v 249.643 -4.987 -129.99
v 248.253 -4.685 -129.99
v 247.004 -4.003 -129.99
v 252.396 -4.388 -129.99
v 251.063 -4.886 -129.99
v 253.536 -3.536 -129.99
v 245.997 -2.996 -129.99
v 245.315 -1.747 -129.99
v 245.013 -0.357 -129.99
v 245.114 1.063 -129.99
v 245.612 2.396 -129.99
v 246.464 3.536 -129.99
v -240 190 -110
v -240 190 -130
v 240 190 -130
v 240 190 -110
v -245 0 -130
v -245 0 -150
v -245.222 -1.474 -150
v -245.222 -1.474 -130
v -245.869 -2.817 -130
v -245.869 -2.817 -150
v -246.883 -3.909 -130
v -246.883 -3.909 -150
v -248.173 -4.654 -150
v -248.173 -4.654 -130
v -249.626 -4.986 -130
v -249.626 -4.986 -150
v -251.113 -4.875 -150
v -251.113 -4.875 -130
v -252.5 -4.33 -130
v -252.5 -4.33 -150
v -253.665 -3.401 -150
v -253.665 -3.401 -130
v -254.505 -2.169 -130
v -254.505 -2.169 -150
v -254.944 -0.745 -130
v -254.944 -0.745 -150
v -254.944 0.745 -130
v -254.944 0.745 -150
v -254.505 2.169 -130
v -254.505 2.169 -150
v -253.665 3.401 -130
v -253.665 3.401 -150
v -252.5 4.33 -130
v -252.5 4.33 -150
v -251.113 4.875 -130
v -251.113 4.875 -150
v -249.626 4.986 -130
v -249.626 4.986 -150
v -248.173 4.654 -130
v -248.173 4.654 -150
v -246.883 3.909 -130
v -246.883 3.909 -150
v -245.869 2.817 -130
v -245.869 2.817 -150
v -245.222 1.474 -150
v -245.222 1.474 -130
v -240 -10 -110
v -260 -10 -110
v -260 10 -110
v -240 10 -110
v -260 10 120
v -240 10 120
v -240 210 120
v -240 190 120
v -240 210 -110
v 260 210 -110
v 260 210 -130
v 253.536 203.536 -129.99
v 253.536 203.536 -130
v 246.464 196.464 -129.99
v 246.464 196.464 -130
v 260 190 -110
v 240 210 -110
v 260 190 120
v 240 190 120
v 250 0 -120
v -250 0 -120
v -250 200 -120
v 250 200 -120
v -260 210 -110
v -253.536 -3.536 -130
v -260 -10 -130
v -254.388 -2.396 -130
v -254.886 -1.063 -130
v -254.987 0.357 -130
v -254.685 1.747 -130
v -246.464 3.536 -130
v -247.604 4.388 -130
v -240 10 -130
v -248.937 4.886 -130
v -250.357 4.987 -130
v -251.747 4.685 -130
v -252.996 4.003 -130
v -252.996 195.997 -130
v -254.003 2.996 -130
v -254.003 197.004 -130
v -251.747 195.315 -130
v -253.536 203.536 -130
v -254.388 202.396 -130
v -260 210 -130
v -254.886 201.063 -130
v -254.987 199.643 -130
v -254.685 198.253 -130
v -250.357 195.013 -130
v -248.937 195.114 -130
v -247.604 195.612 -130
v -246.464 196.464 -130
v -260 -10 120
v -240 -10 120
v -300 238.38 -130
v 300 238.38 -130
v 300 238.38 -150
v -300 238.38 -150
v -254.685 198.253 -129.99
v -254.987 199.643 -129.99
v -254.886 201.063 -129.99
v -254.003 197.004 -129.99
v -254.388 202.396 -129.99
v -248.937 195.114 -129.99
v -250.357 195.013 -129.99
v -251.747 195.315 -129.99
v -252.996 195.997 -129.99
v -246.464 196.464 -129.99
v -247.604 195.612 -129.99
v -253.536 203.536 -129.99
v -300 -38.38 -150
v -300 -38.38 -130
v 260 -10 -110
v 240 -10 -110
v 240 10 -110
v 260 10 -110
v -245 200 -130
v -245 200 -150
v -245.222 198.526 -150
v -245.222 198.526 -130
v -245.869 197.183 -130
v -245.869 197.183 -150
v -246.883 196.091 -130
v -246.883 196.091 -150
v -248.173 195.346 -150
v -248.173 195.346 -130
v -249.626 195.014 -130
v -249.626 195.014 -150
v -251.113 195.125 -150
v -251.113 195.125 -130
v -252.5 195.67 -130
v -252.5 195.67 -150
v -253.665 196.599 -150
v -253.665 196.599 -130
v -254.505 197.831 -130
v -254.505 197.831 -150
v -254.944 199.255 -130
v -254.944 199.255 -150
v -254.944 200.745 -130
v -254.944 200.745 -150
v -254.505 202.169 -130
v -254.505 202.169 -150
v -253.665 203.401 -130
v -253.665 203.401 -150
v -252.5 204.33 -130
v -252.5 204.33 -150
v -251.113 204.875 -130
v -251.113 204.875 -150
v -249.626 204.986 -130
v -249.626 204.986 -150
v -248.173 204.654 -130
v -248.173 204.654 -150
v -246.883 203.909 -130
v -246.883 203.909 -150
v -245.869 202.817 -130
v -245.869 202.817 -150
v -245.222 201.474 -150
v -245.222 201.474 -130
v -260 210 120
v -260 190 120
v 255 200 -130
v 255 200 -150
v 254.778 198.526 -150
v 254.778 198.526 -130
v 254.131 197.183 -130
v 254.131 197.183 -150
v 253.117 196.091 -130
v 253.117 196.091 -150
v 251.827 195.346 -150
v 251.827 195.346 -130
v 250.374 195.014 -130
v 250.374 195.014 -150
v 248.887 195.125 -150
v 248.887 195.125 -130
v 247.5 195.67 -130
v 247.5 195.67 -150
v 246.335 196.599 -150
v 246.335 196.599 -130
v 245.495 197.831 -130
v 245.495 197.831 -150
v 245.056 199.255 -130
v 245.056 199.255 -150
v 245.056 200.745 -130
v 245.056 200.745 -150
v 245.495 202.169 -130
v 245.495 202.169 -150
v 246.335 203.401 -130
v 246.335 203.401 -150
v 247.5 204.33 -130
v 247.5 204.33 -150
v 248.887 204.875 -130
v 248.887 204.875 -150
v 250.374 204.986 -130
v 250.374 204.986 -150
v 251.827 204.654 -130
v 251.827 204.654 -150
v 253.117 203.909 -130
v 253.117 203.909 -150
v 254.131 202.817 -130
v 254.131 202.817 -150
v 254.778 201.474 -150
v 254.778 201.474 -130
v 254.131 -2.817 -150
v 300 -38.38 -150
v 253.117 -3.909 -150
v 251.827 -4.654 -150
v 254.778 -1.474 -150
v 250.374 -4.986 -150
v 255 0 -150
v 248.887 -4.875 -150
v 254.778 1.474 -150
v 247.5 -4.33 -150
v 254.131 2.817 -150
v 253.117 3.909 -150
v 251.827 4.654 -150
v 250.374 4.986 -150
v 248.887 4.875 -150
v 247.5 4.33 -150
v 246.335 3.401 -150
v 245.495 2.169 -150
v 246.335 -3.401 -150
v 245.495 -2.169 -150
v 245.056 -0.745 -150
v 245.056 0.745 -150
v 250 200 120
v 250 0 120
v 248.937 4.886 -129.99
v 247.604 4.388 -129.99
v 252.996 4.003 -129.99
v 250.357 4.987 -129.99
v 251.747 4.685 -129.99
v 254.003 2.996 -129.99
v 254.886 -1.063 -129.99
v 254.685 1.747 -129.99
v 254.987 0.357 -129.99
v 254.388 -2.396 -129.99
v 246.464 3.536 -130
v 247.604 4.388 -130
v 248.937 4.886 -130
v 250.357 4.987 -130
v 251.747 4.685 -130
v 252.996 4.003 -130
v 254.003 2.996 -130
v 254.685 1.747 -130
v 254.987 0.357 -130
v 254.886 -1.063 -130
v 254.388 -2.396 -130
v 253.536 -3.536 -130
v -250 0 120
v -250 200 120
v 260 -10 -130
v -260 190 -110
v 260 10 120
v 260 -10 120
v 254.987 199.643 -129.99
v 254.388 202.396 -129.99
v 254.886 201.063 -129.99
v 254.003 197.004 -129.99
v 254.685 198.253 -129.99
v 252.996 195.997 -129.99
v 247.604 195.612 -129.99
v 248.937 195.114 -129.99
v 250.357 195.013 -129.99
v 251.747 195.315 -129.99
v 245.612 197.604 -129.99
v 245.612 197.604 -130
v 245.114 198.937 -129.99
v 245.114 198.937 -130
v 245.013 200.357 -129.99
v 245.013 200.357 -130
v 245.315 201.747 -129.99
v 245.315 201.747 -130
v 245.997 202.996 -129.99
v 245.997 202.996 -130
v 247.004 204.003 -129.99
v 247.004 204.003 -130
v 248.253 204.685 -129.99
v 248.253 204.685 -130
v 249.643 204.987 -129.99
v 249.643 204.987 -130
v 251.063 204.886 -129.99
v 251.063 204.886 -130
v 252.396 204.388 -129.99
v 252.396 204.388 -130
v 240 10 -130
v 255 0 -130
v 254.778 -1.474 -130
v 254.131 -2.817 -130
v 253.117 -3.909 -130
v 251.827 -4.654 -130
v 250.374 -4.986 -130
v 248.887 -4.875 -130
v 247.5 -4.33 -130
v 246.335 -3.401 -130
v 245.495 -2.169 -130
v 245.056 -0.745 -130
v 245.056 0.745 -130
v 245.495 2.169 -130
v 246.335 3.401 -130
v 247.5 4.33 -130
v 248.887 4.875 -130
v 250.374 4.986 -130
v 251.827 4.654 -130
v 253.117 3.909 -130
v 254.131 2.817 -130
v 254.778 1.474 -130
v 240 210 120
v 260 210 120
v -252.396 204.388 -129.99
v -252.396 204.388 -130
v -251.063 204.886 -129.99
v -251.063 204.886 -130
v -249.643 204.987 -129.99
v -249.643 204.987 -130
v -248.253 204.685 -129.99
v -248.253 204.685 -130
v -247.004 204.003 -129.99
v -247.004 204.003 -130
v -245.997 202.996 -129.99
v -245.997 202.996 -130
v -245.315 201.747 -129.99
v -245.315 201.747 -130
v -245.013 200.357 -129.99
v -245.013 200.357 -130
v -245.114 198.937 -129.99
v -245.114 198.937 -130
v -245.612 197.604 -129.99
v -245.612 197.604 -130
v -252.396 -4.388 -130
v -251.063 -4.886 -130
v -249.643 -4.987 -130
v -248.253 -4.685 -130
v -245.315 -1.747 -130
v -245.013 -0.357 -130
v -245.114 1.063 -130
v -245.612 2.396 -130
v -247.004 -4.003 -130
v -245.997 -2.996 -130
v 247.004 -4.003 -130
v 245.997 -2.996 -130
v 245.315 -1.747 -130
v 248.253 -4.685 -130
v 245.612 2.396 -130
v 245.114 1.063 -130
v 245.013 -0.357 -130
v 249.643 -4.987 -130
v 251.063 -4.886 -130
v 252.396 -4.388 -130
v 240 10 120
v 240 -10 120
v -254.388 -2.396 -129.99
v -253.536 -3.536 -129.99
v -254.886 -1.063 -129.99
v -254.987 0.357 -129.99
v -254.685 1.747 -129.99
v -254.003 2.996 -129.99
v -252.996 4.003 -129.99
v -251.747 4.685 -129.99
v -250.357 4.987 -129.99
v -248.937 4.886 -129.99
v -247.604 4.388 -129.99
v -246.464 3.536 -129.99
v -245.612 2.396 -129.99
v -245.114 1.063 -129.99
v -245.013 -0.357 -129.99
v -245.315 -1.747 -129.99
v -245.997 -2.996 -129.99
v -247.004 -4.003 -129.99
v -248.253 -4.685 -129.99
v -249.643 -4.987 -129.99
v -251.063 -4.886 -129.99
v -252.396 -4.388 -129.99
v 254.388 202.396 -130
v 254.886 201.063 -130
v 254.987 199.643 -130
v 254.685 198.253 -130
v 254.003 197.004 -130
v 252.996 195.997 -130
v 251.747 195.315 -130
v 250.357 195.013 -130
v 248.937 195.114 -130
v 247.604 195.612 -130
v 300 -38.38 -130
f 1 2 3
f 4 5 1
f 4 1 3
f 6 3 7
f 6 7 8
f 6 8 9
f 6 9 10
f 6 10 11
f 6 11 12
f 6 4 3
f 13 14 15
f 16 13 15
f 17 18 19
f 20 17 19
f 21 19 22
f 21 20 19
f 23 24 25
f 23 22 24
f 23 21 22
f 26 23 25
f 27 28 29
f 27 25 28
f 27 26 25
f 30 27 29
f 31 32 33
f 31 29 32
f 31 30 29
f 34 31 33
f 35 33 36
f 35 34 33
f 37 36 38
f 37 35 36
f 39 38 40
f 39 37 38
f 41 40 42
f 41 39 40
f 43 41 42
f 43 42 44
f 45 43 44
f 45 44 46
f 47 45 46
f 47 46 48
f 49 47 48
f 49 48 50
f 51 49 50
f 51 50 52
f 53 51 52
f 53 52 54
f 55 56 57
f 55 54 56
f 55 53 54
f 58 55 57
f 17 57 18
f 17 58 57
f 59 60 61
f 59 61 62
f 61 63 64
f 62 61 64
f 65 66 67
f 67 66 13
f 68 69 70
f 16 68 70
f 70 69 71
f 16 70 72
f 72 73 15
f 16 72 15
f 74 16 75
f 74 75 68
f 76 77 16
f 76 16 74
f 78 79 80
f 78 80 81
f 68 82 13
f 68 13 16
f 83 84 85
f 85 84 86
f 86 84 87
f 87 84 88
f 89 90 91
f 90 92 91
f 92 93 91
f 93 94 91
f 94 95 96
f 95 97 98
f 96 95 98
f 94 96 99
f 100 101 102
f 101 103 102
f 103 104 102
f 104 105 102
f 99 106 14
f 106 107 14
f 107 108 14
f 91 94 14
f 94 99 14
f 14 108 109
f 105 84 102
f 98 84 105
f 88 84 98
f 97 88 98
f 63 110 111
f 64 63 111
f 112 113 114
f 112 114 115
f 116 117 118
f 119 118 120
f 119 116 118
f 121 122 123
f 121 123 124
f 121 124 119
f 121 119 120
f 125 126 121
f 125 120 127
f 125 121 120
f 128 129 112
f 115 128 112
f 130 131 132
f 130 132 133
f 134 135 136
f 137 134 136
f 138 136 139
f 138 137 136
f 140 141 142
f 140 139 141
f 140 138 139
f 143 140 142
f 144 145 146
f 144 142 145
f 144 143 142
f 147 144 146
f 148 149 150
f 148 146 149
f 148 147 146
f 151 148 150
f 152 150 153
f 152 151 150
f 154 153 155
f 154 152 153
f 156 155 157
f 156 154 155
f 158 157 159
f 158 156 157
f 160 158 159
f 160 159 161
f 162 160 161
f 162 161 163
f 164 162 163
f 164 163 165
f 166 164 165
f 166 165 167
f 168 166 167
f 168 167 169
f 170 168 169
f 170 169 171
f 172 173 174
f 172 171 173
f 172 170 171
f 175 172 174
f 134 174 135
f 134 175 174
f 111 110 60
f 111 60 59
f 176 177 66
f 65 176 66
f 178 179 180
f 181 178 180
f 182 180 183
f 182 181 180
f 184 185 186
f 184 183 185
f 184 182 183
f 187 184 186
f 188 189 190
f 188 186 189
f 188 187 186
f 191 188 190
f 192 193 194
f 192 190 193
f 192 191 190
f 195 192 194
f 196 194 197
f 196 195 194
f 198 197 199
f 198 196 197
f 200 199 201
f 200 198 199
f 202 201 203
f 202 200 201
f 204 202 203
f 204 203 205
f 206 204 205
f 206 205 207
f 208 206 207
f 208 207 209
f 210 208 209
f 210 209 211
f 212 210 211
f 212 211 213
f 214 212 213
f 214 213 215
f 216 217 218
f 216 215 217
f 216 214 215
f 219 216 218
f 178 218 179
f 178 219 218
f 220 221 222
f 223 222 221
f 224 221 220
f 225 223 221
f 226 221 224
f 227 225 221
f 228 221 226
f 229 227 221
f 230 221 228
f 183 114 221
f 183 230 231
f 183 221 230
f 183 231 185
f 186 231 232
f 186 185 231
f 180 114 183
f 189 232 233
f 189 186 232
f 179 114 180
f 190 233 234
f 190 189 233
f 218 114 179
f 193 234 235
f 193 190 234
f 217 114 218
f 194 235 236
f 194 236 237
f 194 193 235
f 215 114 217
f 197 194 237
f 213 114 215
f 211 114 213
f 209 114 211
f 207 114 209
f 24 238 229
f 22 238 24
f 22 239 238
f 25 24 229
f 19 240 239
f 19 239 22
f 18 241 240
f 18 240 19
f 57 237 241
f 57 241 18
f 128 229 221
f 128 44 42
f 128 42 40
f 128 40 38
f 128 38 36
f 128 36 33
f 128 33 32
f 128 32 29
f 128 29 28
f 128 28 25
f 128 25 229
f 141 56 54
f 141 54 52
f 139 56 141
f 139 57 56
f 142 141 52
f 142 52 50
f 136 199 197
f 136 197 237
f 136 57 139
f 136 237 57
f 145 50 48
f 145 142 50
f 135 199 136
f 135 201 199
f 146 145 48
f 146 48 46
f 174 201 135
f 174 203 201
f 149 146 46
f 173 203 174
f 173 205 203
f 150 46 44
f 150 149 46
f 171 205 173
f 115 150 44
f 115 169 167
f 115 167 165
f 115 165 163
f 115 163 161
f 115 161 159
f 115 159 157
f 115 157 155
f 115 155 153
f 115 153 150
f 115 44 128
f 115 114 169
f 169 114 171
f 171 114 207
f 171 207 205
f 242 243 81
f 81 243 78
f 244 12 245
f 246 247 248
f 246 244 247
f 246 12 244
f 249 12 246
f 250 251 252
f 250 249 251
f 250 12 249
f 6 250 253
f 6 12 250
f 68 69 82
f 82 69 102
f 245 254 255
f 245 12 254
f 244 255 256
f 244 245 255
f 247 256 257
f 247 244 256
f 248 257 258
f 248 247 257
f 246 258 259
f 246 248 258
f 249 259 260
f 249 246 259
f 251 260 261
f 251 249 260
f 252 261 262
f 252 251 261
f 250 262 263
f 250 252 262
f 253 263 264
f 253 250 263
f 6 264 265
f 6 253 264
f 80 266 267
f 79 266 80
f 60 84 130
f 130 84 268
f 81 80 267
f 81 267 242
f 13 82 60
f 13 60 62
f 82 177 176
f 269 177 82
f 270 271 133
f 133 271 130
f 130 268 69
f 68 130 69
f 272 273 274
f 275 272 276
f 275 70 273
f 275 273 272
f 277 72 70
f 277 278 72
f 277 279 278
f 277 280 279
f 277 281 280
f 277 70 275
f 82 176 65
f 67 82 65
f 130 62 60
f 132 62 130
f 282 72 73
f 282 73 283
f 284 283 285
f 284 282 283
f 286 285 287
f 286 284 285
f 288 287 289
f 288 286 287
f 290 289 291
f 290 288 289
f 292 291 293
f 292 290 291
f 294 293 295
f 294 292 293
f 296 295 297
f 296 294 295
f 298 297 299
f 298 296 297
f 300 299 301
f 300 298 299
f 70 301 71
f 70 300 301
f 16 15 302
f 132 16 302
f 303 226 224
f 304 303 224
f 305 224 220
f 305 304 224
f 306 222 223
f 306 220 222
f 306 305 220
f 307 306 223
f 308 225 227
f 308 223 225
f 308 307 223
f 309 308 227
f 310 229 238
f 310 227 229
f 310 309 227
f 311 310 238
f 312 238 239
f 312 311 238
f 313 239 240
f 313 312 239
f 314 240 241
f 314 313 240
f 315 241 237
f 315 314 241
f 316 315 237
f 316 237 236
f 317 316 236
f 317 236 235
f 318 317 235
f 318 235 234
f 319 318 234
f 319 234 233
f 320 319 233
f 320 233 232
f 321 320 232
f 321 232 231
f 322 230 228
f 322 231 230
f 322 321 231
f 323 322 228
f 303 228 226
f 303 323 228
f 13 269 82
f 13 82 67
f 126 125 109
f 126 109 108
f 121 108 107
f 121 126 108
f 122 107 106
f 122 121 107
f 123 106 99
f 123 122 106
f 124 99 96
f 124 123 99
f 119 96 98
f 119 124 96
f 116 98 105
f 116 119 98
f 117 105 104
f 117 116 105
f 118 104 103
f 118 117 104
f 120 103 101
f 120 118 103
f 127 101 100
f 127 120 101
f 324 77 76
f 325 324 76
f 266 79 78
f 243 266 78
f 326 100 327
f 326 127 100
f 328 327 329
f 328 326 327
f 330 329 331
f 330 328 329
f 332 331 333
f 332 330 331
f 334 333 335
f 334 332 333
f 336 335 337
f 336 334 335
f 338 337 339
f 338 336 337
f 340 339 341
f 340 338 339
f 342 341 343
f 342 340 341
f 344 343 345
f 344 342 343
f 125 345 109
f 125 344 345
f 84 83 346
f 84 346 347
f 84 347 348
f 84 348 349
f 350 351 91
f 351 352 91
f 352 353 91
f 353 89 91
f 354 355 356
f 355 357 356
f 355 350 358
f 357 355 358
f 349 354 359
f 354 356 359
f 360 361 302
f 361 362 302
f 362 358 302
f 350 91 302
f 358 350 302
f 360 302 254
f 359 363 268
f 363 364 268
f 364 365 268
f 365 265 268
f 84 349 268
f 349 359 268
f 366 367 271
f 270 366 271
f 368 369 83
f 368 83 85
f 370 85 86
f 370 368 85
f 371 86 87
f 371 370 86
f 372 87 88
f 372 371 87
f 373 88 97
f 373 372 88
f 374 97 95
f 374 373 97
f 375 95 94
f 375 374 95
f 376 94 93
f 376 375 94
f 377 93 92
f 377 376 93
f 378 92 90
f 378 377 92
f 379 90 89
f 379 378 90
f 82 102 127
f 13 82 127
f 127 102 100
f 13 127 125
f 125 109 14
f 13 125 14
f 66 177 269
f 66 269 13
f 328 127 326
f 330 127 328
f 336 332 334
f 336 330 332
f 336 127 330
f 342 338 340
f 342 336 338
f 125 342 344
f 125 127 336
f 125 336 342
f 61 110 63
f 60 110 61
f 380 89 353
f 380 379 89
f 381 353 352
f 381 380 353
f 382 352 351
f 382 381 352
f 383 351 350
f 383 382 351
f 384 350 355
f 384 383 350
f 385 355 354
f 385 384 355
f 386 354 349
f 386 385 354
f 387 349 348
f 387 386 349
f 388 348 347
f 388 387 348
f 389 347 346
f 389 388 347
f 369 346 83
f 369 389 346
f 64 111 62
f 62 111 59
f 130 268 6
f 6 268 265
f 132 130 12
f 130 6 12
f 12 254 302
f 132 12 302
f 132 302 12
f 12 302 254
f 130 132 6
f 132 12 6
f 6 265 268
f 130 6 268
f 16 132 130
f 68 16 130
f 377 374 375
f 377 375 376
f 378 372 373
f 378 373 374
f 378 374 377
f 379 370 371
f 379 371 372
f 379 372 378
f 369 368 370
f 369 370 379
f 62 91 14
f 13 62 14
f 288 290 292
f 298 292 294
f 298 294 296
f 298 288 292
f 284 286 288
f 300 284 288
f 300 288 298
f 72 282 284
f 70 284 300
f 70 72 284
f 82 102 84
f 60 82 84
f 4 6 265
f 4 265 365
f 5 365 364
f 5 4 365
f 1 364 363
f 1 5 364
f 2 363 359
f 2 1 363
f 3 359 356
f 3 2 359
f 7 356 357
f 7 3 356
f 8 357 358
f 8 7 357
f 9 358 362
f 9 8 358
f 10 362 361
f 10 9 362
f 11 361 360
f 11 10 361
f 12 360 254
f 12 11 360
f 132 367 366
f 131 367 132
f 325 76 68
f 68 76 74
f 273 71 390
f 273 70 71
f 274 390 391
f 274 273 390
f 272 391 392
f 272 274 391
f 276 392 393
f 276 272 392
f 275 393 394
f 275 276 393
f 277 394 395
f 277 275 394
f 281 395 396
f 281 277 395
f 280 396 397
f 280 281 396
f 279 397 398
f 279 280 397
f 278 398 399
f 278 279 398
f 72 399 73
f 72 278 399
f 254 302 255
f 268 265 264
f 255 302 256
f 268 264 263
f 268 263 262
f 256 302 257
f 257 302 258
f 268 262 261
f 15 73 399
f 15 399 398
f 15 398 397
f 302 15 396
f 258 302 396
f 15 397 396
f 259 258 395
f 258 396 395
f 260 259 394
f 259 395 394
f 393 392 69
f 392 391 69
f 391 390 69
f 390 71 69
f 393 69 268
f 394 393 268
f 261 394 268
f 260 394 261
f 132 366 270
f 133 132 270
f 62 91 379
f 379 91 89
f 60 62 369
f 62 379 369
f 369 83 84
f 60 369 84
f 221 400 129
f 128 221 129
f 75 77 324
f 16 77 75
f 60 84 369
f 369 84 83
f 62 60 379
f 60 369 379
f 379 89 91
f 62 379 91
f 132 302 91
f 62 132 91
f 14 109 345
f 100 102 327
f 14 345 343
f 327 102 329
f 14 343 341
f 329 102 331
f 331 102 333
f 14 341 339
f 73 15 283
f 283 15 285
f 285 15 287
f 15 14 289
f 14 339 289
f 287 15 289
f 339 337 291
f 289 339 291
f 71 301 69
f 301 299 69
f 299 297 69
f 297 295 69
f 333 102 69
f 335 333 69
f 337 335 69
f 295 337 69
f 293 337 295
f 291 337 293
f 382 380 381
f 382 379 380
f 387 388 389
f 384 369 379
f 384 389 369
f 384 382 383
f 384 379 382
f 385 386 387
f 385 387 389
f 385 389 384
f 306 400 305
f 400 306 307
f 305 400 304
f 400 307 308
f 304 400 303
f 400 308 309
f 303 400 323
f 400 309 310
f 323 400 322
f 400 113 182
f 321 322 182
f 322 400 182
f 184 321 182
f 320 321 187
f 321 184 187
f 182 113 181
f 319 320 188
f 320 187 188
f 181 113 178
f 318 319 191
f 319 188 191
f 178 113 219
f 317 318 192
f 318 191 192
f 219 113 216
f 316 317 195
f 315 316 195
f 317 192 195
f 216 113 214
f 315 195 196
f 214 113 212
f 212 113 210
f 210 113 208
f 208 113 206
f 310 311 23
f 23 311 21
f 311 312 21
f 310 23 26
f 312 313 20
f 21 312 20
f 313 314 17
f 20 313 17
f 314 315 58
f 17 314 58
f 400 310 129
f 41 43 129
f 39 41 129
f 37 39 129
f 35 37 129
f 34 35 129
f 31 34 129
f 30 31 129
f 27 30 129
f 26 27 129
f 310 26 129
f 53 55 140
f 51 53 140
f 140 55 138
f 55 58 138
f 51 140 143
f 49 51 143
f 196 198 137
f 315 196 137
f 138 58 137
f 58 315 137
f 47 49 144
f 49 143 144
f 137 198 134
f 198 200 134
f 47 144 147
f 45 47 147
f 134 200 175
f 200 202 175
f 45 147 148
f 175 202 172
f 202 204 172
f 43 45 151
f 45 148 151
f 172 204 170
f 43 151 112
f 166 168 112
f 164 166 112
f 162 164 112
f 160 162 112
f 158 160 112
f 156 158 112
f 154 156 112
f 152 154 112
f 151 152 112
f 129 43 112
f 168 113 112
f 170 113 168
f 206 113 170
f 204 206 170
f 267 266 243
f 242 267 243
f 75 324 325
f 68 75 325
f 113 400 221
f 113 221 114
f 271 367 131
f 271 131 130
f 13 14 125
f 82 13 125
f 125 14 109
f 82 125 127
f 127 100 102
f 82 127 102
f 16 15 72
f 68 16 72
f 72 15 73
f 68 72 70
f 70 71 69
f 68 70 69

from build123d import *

# Parameters (mm, degrees)
SKETCH2_W                               = 500
SKETCH2_H                               = 240
BOSS_EXTRUDE1_DEPTH                     = 200
SQUARE_RODS_START                       = -10
SQUARE_RODS_SQUARE_BAR_20_2_OUTLINE_W   = 20
SQUARE_RODS_SQUARE_BAR_20_2_OUTLINE_H   = 230
SQUARE_RODS_SQUARE_BAR_20_2_DEPTH       = 20
SQUARE_RODS_START_2                     = -130
SQUARE_RODS_SQUARE_BAR_20_2_2_DEPTH     = 20
SQUARE_RODS_SQUARE_BAR_20_2_3_DEPTH     = 20
SQUARE_RODS_SQUARE_BAR_20_2_4_OUTLINE_W = 20
SQUARE_RODS_SQUARE_BAR_20_2_4_OUTLINE_H = 230
SQUARE_RODS_SQUARE_BAR_20_2_4_DEPTH     = 20
SQUARE_RODS_SQUARE_BAR_20_2_5_DEPTH     = 20
SQUARE_RODS_START_3                     = 190
SQUARE_RODS_SQUARE_BAR_20_2_6_OUTLINE_W = 20
SQUARE_RODS_SQUARE_BAR_20_2_6_OUTLINE_H = 230
SQUARE_RODS_SQUARE_BAR_20_2_6_DEPTH     = 20
SQUARE_RODS_SQUARE_BAR_20_2_7_DEPTH     = 20
SQUARE_RODS_SQUARE_BAR_20_2_8_OUTLINE_W = 20
SQUARE_RODS_SQUARE_BAR_20_2_8_OUTLINE_H = 230
SQUARE_RODS_SQUARE_BAR_20_2_8_DEPTH     = 20
SKETCH8_W                               = 600
SKETCH8_H                               = 276.75915278
BOSS_EXTRUDE2_DEPTH                     = 20
CUT_EXTRUDE4_DEPTH                      = 458.520297298
CUT_EXTRUDE4_DEPTH_BACK                 = 0.01
SKETCH9_R                               = 5


# Read off the part's stored shape, not the designer's step: Square-rods SQUARE BAR 20(2)
with BuildPart() as part:
    # Sketch2 → Boss-Extrude1 (new body)
    with BuildSketch(Plane(origin=(0, 0, 0), x_dir=(1, 0, 0), z_dir=(0, 1, 0))):
        Rectangle(SKETCH2_W, SKETCH2_H)
    extrude(amount=BOSS_EXTRUDE1_DEPTH)


with BuildPart() as body_2:
    # Square-rods SQUARE BAR 20(2) outline → Square-rods SQUARE BAR 20(2) (new body)
    with BuildSketch(Plane(origin=(0, 0, 0), x_dir=(1, 0, 0), z_dir=(0, 1, 0)).offset(SQUARE_RODS_START)):
        with Locations((-250, -5)):
            Rectangle(SQUARE_RODS_SQUARE_BAR_20_2_OUTLINE_W, SQUARE_RODS_SQUARE_BAR_20_2_OUTLINE_H)
    extrude(amount=SQUARE_RODS_SQUARE_BAR_20_2_DEPTH)


with BuildPart() as body_3:
    # Square-rods SQUARE BAR 20_2 2 outline → Square-rods SQUARE BAR 20_2 2 (new body)
    with BuildSketch(Plane.XY.offset(SQUARE_RODS_START_2)):
        Polygon((-260, -10), (260, -10), (240, 10), (-240, 10), align=None)
    extrude(amount=SQUARE_RODS_SQUARE_BAR_20_2_2_DEPTH)


with BuildPart() as body_4:
    # Square-rods SQUARE BAR 20_2 3 outline → Square-rods SQUARE BAR 20_2 3 (new body)
    with BuildSketch(Plane.XY.offset(SQUARE_RODS_START_2)):
        Polygon((-260, 210), (-260, -10), (-240, 10), (-240, 190), align=None)
    extrude(amount=SQUARE_RODS_SQUARE_BAR_20_2_3_DEPTH)


with BuildPart() as body_5:
    # Square-rods SQUARE BAR 20_2 4 outline → Square-rods SQUARE BAR 20_2 4 (new body)
    with BuildSketch(Plane(origin=(0, 0, 0), x_dir=(1, 0, 0), z_dir=(0, 1, 0)).offset(SQUARE_RODS_START)):
        with Locations((250, -5)):
            Rectangle(SQUARE_RODS_SQUARE_BAR_20_2_4_OUTLINE_W, SQUARE_RODS_SQUARE_BAR_20_2_4_OUTLINE_H)
    extrude(amount=SQUARE_RODS_SQUARE_BAR_20_2_4_DEPTH)


with BuildPart() as body_6:
    # Square-rods SQUARE BAR 20_2 5 outline → Square-rods SQUARE BAR 20_2 5 (new body)
    with BuildSketch(Plane.XY.offset(SQUARE_RODS_START_2)):
        Polygon((260, -10), (260, 210), (240, 190), (240, 10), align=None)
    extrude(amount=SQUARE_RODS_SQUARE_BAR_20_2_5_DEPTH)


with BuildPart() as body_7:
    # Square-rods SQUARE BAR 20_2 6 outline → Square-rods SQUARE BAR 20_2 6 (new body)
    with BuildSketch(Plane(origin=(0, 0, 0), x_dir=(1, 0, 0), z_dir=(0, 1, 0)).offset(SQUARE_RODS_START_3)):
        with Locations((250, -5)):
            Rectangle(SQUARE_RODS_SQUARE_BAR_20_2_6_OUTLINE_W, SQUARE_RODS_SQUARE_BAR_20_2_6_OUTLINE_H)
    extrude(amount=SQUARE_RODS_SQUARE_BAR_20_2_6_DEPTH)


with BuildPart() as body_8:
    # Square-rods SQUARE BAR 20_2 7 outline → Square-rods SQUARE BAR 20_2 7 (new body)
    with BuildSketch(Plane.XY.offset(SQUARE_RODS_START_2)):
        Polygon((260, 210), (-260, 210), (-240, 190), (240, 190), align=None)
    extrude(amount=SQUARE_RODS_SQUARE_BAR_20_2_7_DEPTH)


with BuildPart() as body_9:
    # Square-rods SQUARE BAR 20_2 8 outline → Square-rods SQUARE BAR 20_2 8 (new body)
    with BuildSketch(Plane(origin=(0, 0, 0), x_dir=(1, 0, 0), z_dir=(0, 1, 0)).offset(SQUARE_RODS_START_3)):
        with Locations((-250, -5)):
            Rectangle(SQUARE_RODS_SQUARE_BAR_20_2_8_OUTLINE_W, SQUARE_RODS_SQUARE_BAR_20_2_8_OUTLINE_H)
    extrude(amount=SQUARE_RODS_SQUARE_BAR_20_2_8_DEPTH)


with BuildPart() as body_10:
    # Sketch8 → Boss-Extrude2 (new body)
    with BuildSketch(Plane(origin=(0, 0, -130), x_dir=(-1, 0, 0), z_dir=(0, 0, -1))):
        with Locations((0, 100)):
            Rectangle(SKETCH8_W, SKETCH8_H)
    extrude(amount=BOSS_EXTRUDE2_DEPTH)


with BuildPart() as cut_extrude4_tool:
    # Sketch9 → Cut-Extrude4 (new, two sides: drawn at the far end of the back side and taken through both)
    with BuildSketch(Plane(origin=(0, 0, -130), x_dir=(-1, 0, 0), z_dir=(0, 0, -1)).offset(-CUT_EXTRUDE4_DEPTH_BACK)):
        with Locations(Location((-250, 200, 0), (0, 0, 180))):
            Circle(SKETCH9_R)
        with Locations(Location((250, 200, 0), (0, 0, 180))):
            Circle(SKETCH9_R)
        with Locations(Location((250, 0, 0), (0, 0, 180))):
            Circle(SKETCH9_R)
        with Locations(Location((-250, 0, 0), (0, 0, 180))):
            Circle(SKETCH9_R)
    extrude(amount=CUT_EXTRUDE4_DEPTH + CUT_EXTRUDE4_DEPTH_BACK)


with BuildPart() as body_3_1:
    add(body_3.part)

    # Cut-Extrude4: cut by cut_extrude4_tool
    add(cut_extrude4_tool.part, mode=Mode.SUBTRACT)


with BuildPart() as body_4_1:
    add(body_4.part)

    # Cut-Extrude4: cut by cut_extrude4_tool
    add(cut_extrude4_tool.part, mode=Mode.SUBTRACT)


with BuildPart() as body_6_1:
    add(body_6.part)

    # Cut-Extrude4: cut by cut_extrude4_tool
    add(cut_extrude4_tool.part, mode=Mode.SUBTRACT)


with BuildPart() as body_8_1:
    add(body_8.part)

    # Cut-Extrude4: cut by cut_extrude4_tool
    add(cut_extrude4_tool.part, mode=Mode.SUBTRACT)


with BuildPart() as body_10_1:
    add(body_10.part)

    # Cut-Extrude4: cut by cut_extrude4_tool
    add(cut_extrude4_tool.part, mode=Mode.SUBTRACT)


solid = Compound([part.part, body_2.part, body_5.part, body_7.part, body_9.part, body_3_1.part, body_4_1.part, body_6_1.part, body_8_1.part, body_10_1.part])
